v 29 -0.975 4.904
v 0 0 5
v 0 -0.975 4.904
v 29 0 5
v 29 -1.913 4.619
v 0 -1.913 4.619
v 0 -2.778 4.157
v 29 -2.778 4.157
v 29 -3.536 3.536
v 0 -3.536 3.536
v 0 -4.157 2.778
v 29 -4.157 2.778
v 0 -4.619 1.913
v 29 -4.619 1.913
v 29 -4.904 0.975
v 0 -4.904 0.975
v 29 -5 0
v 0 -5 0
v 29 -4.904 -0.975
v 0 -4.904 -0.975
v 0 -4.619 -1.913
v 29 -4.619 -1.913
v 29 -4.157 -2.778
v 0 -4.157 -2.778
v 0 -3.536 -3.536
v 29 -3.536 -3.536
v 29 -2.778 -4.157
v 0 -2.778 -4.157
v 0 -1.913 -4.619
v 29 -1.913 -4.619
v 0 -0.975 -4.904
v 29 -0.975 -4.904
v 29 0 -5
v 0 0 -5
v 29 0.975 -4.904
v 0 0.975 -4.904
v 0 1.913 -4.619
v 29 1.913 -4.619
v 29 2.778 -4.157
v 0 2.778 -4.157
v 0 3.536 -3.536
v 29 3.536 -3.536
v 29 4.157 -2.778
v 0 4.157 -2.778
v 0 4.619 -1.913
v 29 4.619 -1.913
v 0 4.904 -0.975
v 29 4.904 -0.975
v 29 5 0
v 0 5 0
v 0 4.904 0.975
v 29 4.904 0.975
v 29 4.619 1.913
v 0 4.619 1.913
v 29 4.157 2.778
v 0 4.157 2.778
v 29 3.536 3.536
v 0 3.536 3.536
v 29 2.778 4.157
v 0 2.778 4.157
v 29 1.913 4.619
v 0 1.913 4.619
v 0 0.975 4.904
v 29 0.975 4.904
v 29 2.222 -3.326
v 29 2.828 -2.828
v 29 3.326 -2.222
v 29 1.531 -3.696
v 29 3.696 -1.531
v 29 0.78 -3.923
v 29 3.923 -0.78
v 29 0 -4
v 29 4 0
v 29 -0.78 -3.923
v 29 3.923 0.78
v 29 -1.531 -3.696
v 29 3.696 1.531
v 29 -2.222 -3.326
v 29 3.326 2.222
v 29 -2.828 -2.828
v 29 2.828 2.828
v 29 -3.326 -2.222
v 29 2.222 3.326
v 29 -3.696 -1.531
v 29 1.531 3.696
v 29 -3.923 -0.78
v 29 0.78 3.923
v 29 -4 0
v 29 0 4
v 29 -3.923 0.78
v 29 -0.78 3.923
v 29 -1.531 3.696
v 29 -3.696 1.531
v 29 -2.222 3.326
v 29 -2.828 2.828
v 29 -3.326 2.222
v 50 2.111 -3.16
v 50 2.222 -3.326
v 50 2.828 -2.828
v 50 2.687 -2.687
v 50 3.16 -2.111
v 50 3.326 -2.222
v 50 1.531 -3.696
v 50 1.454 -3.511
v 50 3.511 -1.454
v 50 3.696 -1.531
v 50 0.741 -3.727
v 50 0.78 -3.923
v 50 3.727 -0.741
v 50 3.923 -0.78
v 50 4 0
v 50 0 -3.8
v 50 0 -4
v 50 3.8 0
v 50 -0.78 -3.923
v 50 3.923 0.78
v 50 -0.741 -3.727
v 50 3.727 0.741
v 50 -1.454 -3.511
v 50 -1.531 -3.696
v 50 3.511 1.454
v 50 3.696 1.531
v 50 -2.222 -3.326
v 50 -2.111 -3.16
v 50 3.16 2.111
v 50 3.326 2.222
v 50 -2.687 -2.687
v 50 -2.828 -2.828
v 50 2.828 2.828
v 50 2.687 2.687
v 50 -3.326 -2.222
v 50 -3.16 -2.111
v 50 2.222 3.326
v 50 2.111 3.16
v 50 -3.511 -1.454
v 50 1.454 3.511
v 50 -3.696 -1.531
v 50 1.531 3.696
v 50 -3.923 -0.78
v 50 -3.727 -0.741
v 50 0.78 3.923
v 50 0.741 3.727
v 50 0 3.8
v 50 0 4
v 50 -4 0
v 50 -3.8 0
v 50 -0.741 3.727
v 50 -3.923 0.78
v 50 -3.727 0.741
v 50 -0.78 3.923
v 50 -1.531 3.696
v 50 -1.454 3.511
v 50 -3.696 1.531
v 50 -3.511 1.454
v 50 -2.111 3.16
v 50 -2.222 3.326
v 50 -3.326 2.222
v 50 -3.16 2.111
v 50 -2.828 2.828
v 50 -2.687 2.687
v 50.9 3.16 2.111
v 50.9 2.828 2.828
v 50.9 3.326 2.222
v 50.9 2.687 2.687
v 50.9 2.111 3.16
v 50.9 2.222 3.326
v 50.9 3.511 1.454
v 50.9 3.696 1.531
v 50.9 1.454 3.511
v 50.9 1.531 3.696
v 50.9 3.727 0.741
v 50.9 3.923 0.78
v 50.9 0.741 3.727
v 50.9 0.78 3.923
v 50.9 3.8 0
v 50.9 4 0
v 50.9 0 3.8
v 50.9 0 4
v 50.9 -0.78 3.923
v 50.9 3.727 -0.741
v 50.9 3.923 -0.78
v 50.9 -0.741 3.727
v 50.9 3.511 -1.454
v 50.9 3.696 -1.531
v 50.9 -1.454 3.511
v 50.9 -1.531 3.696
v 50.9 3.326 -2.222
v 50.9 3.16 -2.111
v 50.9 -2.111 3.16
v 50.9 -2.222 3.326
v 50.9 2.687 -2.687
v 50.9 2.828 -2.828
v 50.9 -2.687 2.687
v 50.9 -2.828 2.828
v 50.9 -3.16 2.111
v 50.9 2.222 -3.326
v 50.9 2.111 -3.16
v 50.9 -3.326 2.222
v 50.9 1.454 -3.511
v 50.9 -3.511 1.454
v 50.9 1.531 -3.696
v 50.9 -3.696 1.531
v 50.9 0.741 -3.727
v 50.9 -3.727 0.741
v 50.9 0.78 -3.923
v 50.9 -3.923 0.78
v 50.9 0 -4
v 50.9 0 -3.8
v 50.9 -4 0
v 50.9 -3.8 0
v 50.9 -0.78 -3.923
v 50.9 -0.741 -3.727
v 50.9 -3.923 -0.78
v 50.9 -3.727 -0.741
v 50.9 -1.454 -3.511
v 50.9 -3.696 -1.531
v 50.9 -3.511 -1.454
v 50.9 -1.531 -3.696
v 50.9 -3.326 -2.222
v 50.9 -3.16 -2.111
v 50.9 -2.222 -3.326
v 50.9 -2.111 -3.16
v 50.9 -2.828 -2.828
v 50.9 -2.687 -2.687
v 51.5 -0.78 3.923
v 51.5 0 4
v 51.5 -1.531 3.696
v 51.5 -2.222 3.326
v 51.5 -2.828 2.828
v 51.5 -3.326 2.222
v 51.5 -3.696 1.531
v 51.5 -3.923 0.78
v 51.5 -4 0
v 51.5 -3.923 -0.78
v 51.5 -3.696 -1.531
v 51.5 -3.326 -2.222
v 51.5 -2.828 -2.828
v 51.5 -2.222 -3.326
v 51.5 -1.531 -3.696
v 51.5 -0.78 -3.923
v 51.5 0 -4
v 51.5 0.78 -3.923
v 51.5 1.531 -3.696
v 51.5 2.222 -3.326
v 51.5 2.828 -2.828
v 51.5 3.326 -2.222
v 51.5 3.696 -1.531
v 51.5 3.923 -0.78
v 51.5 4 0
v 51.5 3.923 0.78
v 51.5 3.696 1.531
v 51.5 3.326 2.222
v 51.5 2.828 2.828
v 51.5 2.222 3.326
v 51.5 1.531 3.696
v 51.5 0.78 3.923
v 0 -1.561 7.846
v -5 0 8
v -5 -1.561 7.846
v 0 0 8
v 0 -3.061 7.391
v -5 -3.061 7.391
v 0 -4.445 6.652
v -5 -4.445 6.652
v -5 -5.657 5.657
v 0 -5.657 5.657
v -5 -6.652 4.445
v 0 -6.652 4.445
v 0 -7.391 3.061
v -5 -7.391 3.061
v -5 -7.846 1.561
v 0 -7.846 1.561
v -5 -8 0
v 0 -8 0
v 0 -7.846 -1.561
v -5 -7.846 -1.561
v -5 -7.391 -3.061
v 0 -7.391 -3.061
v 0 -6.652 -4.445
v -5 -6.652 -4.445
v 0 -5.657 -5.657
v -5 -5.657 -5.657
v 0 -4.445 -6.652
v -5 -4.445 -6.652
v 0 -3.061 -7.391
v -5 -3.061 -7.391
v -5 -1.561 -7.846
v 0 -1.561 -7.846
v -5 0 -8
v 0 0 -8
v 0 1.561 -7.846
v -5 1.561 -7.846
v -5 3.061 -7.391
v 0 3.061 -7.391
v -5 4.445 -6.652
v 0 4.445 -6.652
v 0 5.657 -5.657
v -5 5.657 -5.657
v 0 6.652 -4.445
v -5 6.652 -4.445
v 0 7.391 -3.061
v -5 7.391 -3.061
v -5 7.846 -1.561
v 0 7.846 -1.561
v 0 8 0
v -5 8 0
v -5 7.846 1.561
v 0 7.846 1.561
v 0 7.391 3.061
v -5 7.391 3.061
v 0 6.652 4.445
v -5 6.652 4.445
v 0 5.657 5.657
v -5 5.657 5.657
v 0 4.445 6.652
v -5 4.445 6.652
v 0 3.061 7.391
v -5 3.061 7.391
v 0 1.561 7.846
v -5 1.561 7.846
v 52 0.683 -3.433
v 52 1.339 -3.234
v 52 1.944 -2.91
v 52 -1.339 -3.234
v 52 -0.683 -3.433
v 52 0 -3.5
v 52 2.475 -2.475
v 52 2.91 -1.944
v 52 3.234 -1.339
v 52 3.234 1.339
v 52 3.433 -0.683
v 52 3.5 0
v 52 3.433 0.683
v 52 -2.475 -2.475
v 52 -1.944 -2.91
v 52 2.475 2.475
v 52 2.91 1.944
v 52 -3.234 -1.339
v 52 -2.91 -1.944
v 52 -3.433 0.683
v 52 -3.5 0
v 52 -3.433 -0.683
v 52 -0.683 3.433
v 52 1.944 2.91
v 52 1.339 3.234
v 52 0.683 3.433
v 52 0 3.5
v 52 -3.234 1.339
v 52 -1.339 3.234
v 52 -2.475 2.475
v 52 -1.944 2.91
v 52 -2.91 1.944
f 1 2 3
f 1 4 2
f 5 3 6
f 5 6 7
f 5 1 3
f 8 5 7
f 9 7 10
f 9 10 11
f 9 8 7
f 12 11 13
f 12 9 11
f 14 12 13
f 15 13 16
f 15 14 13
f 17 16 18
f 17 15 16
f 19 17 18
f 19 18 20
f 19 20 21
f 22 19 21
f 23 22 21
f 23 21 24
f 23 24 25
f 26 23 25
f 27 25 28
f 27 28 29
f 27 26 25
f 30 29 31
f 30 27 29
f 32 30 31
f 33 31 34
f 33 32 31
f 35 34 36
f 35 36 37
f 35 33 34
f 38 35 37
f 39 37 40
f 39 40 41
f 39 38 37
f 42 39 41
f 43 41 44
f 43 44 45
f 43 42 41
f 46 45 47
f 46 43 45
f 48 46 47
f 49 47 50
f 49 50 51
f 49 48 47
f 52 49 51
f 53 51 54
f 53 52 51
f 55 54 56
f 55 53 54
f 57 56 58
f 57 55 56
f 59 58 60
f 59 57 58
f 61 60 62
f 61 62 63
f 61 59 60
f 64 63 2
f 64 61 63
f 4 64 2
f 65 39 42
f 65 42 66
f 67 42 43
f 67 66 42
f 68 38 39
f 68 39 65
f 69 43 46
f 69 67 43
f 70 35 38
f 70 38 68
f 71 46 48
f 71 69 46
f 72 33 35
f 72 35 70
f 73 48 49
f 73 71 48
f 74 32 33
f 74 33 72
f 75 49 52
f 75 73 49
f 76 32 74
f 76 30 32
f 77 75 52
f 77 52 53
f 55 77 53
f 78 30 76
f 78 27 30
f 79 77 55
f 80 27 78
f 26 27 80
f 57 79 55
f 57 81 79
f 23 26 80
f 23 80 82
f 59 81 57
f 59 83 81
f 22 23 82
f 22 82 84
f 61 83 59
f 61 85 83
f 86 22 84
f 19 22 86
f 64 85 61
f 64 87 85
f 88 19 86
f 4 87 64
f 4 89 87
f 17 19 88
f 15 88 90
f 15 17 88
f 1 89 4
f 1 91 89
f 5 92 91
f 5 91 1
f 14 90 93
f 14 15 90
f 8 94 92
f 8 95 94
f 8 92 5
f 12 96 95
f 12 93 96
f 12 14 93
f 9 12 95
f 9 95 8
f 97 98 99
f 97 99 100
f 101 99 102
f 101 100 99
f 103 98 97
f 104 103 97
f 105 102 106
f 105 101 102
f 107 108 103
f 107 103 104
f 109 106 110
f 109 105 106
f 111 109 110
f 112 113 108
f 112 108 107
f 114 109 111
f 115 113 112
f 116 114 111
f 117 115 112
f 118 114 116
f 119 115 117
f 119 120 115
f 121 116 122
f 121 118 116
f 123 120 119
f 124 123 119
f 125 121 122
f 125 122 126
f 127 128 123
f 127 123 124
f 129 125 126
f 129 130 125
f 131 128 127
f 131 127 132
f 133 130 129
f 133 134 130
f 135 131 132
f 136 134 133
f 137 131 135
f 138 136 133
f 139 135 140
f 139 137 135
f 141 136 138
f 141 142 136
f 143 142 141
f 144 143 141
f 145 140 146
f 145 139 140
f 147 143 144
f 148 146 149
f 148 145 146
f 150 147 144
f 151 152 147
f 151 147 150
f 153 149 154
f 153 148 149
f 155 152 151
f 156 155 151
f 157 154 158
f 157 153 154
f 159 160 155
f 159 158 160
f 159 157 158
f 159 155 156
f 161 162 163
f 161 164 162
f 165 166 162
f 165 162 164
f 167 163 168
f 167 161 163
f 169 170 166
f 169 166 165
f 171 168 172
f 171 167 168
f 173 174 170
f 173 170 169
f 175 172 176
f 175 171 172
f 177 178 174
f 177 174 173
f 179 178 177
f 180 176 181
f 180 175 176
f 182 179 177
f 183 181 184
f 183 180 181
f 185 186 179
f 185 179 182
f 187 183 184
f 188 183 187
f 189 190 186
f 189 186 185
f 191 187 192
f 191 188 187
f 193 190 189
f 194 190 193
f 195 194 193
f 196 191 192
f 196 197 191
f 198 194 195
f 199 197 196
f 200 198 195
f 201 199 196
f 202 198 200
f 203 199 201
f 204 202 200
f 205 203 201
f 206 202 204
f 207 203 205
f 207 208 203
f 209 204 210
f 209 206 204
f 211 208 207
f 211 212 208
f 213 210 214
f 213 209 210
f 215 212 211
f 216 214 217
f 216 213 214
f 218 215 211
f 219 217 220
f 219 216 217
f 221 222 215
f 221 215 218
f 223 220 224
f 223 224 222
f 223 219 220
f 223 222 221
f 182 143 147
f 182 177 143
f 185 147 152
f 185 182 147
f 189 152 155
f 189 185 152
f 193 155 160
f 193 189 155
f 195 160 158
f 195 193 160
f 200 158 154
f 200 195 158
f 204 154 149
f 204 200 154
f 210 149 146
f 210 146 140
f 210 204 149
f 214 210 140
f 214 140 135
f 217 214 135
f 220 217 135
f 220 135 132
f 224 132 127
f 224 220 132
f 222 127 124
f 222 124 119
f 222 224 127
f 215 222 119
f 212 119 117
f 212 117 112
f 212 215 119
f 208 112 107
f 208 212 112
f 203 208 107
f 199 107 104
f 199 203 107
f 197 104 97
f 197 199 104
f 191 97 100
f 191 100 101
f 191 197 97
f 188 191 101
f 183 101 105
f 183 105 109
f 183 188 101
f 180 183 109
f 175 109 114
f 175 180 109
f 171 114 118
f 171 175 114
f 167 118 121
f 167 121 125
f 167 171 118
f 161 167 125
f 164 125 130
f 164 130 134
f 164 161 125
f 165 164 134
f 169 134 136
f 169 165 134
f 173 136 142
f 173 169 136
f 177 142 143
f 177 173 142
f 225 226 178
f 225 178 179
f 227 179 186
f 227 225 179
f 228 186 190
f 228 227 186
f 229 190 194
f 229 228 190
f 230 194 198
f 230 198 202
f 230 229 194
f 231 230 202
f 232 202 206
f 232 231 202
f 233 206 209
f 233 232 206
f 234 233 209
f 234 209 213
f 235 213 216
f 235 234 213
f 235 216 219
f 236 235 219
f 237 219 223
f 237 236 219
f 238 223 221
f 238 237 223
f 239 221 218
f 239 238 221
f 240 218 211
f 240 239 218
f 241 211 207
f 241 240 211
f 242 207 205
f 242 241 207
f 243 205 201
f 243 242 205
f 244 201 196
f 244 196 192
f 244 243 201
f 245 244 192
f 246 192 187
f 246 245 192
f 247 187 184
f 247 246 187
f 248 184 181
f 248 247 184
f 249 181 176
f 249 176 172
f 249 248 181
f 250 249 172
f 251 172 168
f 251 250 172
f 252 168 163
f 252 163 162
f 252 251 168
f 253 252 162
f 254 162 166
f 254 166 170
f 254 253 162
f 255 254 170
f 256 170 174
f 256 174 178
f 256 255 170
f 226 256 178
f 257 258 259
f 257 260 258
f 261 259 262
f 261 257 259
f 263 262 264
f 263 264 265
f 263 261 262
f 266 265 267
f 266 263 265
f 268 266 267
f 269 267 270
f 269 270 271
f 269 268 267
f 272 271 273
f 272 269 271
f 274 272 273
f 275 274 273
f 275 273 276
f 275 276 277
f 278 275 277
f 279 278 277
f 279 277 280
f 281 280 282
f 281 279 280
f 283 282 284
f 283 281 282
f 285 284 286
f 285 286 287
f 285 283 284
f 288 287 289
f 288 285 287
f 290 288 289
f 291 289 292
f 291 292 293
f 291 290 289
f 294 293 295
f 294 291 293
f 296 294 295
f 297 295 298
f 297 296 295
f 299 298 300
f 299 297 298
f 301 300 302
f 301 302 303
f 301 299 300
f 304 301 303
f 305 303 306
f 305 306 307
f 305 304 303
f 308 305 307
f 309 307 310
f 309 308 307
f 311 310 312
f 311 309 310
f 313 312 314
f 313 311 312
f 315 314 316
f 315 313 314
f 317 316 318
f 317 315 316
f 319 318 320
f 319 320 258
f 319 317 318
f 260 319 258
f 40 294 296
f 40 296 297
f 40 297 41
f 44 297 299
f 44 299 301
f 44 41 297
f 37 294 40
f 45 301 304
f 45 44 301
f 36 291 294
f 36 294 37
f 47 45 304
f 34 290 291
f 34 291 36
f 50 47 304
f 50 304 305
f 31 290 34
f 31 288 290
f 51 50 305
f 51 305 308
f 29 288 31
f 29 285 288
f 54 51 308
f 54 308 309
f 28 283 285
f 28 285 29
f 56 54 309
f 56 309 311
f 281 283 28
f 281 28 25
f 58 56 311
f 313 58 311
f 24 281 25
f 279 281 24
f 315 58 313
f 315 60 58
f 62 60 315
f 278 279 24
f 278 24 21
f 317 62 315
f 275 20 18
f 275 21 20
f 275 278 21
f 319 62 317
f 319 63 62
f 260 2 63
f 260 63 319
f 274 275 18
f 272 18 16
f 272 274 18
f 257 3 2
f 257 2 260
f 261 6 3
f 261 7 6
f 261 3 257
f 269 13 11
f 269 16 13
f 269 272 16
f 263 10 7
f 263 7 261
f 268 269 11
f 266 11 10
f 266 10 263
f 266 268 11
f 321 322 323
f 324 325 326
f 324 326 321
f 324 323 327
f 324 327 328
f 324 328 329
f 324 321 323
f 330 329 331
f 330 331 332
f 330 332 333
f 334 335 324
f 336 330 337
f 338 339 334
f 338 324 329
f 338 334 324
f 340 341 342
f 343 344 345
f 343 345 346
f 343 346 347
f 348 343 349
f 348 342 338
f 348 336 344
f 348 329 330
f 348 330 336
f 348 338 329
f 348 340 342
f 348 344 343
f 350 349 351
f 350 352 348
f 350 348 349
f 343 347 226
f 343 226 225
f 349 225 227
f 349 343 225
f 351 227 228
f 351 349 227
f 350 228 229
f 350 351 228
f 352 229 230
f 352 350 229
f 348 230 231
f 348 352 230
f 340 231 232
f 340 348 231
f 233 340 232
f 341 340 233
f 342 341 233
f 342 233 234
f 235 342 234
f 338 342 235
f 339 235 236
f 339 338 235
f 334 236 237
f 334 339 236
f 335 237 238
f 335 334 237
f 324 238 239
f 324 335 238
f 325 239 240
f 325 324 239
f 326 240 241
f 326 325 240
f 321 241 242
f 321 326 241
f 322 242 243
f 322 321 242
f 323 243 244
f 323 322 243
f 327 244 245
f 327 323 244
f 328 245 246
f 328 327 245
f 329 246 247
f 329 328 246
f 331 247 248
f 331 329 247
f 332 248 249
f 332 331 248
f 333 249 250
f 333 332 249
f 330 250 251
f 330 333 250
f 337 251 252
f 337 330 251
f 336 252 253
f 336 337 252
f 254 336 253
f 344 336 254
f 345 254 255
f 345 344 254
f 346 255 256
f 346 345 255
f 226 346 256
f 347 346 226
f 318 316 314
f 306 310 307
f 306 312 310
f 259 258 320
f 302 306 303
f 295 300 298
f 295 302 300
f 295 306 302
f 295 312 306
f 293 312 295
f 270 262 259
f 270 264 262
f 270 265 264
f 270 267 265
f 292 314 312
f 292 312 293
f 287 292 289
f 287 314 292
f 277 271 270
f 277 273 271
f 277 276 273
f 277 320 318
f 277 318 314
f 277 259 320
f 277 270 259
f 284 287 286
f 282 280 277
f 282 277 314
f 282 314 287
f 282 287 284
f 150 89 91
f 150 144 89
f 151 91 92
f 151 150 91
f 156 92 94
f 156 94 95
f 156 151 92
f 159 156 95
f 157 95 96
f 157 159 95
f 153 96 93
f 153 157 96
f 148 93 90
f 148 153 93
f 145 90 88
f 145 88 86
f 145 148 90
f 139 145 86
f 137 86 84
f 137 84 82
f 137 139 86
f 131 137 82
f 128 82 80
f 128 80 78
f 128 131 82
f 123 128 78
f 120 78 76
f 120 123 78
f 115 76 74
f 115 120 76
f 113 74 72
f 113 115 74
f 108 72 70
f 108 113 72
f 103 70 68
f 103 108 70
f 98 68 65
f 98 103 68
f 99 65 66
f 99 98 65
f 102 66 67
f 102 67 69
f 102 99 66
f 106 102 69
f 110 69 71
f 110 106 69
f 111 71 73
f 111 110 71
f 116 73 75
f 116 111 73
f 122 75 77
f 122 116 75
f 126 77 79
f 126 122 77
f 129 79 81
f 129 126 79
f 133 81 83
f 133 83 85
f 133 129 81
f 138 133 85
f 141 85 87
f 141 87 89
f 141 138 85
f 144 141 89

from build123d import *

# Parameters (mm, degrees)
CHAMFER_1_SIZE = 0.5


with BuildPart() as part:
    # Эскиз1 → Повернуть1 (revolve)
    with BuildSketch(Plane.XY, mode=Mode.PRIVATE) as revolve_1_sk:
        Polygon((50.9, 4), (52, 4), (52, 0), (0, 0), (-5, 0), (-5, 8), (0, 8), (0, 5), (29, 5), (29, 4), (50, 4), (50, 3.8), (50.9, 3.8), align=None)
    revolve(revolve_1_sk.sketch.rotate(Axis((0, 0, 0), (1, 0, 0)), 90), axis=Axis((0, 0, 0), (1, 0, 0)))

    # Фаска1
    chamfer_1_edges = [part.edges().sort_by_distance(p)[0] for p in [
        (52, 0, -4),
    ]]
    chamfer(chamfer_1_edges, length=CHAMFER_1_SIZE)


solid = part.part
